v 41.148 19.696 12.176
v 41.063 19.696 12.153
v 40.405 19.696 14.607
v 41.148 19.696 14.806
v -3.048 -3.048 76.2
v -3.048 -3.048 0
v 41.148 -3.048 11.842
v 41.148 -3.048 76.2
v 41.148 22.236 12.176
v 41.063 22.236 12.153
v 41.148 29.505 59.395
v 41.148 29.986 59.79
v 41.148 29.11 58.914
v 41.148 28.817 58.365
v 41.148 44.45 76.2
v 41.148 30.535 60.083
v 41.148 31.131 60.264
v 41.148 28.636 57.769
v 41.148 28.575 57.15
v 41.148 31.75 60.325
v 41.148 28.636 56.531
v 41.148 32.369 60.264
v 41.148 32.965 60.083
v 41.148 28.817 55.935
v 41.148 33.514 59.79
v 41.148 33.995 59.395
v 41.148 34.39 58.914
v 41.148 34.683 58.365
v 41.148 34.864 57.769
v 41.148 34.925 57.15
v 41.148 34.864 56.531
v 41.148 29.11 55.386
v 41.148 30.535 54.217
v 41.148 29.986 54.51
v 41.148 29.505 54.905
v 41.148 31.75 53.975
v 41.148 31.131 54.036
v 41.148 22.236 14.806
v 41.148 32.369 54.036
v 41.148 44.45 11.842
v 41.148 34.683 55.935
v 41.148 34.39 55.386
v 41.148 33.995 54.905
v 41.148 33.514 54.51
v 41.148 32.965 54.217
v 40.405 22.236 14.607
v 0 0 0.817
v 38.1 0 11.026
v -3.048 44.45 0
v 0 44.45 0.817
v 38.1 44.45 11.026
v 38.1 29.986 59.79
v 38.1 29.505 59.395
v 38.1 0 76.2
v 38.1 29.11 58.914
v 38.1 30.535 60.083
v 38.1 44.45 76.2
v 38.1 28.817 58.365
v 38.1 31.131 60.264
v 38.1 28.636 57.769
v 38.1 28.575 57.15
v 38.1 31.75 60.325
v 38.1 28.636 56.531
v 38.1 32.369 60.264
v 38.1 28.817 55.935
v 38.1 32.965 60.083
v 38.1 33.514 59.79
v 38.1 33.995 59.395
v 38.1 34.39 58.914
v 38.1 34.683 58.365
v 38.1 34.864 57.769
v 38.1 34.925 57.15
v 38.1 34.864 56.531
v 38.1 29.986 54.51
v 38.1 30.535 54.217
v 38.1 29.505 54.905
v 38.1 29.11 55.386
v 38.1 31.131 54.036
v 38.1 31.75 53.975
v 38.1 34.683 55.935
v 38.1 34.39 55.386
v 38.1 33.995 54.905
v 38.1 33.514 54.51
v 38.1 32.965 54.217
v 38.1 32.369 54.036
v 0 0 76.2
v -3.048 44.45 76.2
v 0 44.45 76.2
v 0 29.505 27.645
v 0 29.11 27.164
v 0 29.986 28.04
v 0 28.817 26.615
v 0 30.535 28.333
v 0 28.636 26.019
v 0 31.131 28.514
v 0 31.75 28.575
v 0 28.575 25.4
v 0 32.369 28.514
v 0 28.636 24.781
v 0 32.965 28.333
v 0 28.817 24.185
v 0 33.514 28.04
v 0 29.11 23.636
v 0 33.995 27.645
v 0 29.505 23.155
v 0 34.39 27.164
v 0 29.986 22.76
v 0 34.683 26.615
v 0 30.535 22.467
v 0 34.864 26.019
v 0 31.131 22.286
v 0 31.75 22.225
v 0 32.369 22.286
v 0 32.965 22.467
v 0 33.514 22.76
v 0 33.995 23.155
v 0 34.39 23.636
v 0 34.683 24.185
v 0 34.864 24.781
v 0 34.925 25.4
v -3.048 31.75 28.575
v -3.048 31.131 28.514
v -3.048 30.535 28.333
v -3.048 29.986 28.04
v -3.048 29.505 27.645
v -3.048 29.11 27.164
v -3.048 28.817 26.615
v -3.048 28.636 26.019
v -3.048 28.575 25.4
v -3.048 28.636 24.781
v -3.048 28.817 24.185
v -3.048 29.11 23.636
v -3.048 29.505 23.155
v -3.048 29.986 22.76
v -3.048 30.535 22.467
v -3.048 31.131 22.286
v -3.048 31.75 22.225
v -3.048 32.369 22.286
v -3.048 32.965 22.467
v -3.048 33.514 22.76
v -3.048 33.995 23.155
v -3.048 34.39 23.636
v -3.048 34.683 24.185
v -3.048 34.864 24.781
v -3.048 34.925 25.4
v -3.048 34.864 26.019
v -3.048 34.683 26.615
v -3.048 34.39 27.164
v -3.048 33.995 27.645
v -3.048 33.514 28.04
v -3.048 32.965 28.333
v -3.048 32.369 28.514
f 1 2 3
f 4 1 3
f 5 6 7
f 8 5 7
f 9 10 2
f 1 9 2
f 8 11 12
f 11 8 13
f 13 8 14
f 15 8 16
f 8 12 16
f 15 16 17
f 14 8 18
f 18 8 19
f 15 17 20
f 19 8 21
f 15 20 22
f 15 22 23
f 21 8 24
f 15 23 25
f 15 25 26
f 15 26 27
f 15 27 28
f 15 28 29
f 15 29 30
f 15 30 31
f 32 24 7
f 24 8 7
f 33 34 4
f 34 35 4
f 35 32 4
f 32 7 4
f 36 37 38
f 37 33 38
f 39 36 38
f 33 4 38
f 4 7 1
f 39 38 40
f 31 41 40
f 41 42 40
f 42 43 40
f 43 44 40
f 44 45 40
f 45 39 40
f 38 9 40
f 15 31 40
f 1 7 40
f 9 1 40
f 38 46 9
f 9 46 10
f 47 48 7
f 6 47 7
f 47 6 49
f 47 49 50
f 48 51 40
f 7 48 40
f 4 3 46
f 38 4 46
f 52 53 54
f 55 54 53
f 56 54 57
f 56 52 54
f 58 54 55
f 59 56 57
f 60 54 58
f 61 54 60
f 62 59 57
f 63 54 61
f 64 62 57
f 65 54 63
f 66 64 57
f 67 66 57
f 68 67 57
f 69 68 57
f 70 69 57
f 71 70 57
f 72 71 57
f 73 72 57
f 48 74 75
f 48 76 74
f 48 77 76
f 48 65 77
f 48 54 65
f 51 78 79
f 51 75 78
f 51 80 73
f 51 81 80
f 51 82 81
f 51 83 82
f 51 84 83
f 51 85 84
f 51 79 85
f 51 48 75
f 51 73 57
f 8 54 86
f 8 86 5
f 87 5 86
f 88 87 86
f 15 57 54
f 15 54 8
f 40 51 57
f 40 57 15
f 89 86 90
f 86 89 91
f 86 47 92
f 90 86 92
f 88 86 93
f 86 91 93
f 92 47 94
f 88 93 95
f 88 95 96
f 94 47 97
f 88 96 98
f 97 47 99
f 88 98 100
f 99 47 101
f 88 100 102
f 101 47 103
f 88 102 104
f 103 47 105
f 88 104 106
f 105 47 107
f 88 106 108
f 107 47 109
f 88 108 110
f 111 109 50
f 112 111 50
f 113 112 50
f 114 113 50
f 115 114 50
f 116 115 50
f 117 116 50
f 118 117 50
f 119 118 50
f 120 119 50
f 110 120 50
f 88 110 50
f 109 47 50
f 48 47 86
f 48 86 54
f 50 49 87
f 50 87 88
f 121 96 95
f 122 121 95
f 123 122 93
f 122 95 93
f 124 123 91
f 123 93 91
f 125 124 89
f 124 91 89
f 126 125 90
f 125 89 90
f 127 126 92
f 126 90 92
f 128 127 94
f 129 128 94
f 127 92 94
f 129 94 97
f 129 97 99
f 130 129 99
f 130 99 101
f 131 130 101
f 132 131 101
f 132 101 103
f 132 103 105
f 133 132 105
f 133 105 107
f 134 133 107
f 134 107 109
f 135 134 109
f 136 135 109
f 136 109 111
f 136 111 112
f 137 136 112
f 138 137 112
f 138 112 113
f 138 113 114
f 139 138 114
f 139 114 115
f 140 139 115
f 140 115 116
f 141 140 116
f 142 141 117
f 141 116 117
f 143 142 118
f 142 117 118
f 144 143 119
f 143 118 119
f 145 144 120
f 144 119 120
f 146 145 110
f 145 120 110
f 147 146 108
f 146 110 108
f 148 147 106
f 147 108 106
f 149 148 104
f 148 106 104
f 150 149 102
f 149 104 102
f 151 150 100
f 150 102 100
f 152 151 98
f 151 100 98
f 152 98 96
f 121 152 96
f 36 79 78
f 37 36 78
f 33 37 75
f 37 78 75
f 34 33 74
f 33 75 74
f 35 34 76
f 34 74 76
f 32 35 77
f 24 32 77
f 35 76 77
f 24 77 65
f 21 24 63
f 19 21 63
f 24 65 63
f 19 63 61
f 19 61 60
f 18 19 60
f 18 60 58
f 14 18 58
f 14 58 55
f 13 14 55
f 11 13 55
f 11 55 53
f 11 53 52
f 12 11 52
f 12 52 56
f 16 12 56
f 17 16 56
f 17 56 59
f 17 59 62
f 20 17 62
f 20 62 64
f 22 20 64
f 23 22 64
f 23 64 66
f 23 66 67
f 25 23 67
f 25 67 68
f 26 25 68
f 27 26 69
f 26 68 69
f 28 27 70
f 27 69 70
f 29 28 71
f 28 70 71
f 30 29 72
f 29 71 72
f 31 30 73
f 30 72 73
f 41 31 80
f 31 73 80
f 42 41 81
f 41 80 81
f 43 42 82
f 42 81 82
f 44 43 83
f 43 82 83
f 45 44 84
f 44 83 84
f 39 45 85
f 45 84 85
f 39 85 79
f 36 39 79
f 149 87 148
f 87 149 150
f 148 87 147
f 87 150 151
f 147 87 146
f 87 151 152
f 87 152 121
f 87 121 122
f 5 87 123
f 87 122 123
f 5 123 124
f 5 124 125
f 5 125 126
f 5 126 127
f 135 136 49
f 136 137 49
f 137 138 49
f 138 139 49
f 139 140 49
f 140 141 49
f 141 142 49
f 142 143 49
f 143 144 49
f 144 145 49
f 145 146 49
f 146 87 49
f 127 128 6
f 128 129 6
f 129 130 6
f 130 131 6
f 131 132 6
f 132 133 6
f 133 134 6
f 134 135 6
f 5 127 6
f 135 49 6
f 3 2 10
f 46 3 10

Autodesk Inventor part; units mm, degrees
ref_plane "YZ Plane" through (0, 0, 0) normal (1, 0, 0) x (0, 1, 0)
ref_plane "XZ Plane" through (0, 0, 0) normal (0, 1, 0) x (-1, 0, 0)
sketch "Sketch1" plane through (0, 0, 0) normal (0, 0, 1) x (1, 0, 0)
  line L0 (0, 0) -> (38.1, 0)
  line L1 (38.1, 0) -> (38.1, 44.45)
  line L2 (0, 0) -> (0, 44.45)
  line L3 (-3.048, 44.45) -> (-3.048, -3.048)
  line L4 (-3.048, -3.048) -> (41.148, -3.048)
  line L5 (41.148, -3.048) -> (41.148, 44.45)
  line L6 (-3.048, 44.45) -> (0, 44.45)
  line L7 (38.1, 44.45) -> (41.148, 44.45)
  dimension "d0" = 38.1
  dimension "d1" = 44.45
  dimension "d2" = 44.45
  dimension "d3" = 3.048
extrude "channel" add sketch "Sketch1" along normal blind 76.2
sketch "Sketch2" plane through (-3.048, 44.45, 0) normal (0, 1, 0) x (1, 0, 0)
  line L0 (0, 0) -> (49.069, -13.148)
  line L1 (0, 0) -> (50.8, 0) construction
  line L2 (0, 0) -> (49.069, 0)
  line L3 (49.069, -13.148) -> (49.069, 0)
  dimension "d6" = 50.8
  dimension "d7" = 15
extrude "angleCut" cut sketch "Sketch2" against normal blind 101.6
sketch "Sketch3" plane through (41.148, -3.048, 76.2) normal (1, 0, 0) x (0, 0, -1)
  line L0 (64.3577, 47.498) -> (0, 47.498) projected
  line L1 (0, 0) -> (0, 47.498) projected
  circle A0 centre (19.05, 34.798) radius 1.7319
  point P0 (76.2, 3.048)
  dimension "d10" = 19.05
  dimension "d11" = 12.7
hole "Hole1" at (41.148, 31.75, 57.15) direction (-1, 0, 0) diameter 6.35 depth 25.4 tip angle 118
sketch "Sketch5" plane through (-3.048, -3.048, 76.2) normal (-1, 0, 0) x (0, 0, 1)
  line L0 (0, 47.498) -> (0, 0) projected
  line L1 (-76.2, 47.498) -> (0, 47.498) projected
  circle A0 centre (-50.8, 34.798) radius 3.8194
  point P0 (-76.2, 3.048)
  dimension "d19" = 50.8
  dimension "d20" = 12.7
hole "Hole2" at (-3.048, 31.75, 25.4) direction (1, 0, 0) diameter 6.35 depth 25.4 tip angle 118
ref_plane "Work Plane1" through (41.148, 20.701, 11.8423) normal (-0.9659, 0, -0.2588) x (0, 1, 0)
sketch "Sketch6" plane through (41.148, 20.701, 11.8423) normal (-0.9659, 0, -0.2588) x (0, 1, 0)
  line L0 (1.5352, -0.3226) -> (-1.0048, -0.3226)
  line L1 (-1.0048, -0.3226) -> (-1.0048, -2.8626)
  line L2 (-1.0048, -2.8626) -> (1.5352, -2.8626)
  line L3 (1.5352, -2.8626) -> (1.5352, -0.3226)
  point P0 (-20.701, 0.7889)
  dimension "d29" = 2.54
  dimension "d30" = 2.54
extrude "indentMark" cut sketch "Sketch6" against normal blind 101.6
properties part number "endChannelB" material "Steel, Galvanized"
